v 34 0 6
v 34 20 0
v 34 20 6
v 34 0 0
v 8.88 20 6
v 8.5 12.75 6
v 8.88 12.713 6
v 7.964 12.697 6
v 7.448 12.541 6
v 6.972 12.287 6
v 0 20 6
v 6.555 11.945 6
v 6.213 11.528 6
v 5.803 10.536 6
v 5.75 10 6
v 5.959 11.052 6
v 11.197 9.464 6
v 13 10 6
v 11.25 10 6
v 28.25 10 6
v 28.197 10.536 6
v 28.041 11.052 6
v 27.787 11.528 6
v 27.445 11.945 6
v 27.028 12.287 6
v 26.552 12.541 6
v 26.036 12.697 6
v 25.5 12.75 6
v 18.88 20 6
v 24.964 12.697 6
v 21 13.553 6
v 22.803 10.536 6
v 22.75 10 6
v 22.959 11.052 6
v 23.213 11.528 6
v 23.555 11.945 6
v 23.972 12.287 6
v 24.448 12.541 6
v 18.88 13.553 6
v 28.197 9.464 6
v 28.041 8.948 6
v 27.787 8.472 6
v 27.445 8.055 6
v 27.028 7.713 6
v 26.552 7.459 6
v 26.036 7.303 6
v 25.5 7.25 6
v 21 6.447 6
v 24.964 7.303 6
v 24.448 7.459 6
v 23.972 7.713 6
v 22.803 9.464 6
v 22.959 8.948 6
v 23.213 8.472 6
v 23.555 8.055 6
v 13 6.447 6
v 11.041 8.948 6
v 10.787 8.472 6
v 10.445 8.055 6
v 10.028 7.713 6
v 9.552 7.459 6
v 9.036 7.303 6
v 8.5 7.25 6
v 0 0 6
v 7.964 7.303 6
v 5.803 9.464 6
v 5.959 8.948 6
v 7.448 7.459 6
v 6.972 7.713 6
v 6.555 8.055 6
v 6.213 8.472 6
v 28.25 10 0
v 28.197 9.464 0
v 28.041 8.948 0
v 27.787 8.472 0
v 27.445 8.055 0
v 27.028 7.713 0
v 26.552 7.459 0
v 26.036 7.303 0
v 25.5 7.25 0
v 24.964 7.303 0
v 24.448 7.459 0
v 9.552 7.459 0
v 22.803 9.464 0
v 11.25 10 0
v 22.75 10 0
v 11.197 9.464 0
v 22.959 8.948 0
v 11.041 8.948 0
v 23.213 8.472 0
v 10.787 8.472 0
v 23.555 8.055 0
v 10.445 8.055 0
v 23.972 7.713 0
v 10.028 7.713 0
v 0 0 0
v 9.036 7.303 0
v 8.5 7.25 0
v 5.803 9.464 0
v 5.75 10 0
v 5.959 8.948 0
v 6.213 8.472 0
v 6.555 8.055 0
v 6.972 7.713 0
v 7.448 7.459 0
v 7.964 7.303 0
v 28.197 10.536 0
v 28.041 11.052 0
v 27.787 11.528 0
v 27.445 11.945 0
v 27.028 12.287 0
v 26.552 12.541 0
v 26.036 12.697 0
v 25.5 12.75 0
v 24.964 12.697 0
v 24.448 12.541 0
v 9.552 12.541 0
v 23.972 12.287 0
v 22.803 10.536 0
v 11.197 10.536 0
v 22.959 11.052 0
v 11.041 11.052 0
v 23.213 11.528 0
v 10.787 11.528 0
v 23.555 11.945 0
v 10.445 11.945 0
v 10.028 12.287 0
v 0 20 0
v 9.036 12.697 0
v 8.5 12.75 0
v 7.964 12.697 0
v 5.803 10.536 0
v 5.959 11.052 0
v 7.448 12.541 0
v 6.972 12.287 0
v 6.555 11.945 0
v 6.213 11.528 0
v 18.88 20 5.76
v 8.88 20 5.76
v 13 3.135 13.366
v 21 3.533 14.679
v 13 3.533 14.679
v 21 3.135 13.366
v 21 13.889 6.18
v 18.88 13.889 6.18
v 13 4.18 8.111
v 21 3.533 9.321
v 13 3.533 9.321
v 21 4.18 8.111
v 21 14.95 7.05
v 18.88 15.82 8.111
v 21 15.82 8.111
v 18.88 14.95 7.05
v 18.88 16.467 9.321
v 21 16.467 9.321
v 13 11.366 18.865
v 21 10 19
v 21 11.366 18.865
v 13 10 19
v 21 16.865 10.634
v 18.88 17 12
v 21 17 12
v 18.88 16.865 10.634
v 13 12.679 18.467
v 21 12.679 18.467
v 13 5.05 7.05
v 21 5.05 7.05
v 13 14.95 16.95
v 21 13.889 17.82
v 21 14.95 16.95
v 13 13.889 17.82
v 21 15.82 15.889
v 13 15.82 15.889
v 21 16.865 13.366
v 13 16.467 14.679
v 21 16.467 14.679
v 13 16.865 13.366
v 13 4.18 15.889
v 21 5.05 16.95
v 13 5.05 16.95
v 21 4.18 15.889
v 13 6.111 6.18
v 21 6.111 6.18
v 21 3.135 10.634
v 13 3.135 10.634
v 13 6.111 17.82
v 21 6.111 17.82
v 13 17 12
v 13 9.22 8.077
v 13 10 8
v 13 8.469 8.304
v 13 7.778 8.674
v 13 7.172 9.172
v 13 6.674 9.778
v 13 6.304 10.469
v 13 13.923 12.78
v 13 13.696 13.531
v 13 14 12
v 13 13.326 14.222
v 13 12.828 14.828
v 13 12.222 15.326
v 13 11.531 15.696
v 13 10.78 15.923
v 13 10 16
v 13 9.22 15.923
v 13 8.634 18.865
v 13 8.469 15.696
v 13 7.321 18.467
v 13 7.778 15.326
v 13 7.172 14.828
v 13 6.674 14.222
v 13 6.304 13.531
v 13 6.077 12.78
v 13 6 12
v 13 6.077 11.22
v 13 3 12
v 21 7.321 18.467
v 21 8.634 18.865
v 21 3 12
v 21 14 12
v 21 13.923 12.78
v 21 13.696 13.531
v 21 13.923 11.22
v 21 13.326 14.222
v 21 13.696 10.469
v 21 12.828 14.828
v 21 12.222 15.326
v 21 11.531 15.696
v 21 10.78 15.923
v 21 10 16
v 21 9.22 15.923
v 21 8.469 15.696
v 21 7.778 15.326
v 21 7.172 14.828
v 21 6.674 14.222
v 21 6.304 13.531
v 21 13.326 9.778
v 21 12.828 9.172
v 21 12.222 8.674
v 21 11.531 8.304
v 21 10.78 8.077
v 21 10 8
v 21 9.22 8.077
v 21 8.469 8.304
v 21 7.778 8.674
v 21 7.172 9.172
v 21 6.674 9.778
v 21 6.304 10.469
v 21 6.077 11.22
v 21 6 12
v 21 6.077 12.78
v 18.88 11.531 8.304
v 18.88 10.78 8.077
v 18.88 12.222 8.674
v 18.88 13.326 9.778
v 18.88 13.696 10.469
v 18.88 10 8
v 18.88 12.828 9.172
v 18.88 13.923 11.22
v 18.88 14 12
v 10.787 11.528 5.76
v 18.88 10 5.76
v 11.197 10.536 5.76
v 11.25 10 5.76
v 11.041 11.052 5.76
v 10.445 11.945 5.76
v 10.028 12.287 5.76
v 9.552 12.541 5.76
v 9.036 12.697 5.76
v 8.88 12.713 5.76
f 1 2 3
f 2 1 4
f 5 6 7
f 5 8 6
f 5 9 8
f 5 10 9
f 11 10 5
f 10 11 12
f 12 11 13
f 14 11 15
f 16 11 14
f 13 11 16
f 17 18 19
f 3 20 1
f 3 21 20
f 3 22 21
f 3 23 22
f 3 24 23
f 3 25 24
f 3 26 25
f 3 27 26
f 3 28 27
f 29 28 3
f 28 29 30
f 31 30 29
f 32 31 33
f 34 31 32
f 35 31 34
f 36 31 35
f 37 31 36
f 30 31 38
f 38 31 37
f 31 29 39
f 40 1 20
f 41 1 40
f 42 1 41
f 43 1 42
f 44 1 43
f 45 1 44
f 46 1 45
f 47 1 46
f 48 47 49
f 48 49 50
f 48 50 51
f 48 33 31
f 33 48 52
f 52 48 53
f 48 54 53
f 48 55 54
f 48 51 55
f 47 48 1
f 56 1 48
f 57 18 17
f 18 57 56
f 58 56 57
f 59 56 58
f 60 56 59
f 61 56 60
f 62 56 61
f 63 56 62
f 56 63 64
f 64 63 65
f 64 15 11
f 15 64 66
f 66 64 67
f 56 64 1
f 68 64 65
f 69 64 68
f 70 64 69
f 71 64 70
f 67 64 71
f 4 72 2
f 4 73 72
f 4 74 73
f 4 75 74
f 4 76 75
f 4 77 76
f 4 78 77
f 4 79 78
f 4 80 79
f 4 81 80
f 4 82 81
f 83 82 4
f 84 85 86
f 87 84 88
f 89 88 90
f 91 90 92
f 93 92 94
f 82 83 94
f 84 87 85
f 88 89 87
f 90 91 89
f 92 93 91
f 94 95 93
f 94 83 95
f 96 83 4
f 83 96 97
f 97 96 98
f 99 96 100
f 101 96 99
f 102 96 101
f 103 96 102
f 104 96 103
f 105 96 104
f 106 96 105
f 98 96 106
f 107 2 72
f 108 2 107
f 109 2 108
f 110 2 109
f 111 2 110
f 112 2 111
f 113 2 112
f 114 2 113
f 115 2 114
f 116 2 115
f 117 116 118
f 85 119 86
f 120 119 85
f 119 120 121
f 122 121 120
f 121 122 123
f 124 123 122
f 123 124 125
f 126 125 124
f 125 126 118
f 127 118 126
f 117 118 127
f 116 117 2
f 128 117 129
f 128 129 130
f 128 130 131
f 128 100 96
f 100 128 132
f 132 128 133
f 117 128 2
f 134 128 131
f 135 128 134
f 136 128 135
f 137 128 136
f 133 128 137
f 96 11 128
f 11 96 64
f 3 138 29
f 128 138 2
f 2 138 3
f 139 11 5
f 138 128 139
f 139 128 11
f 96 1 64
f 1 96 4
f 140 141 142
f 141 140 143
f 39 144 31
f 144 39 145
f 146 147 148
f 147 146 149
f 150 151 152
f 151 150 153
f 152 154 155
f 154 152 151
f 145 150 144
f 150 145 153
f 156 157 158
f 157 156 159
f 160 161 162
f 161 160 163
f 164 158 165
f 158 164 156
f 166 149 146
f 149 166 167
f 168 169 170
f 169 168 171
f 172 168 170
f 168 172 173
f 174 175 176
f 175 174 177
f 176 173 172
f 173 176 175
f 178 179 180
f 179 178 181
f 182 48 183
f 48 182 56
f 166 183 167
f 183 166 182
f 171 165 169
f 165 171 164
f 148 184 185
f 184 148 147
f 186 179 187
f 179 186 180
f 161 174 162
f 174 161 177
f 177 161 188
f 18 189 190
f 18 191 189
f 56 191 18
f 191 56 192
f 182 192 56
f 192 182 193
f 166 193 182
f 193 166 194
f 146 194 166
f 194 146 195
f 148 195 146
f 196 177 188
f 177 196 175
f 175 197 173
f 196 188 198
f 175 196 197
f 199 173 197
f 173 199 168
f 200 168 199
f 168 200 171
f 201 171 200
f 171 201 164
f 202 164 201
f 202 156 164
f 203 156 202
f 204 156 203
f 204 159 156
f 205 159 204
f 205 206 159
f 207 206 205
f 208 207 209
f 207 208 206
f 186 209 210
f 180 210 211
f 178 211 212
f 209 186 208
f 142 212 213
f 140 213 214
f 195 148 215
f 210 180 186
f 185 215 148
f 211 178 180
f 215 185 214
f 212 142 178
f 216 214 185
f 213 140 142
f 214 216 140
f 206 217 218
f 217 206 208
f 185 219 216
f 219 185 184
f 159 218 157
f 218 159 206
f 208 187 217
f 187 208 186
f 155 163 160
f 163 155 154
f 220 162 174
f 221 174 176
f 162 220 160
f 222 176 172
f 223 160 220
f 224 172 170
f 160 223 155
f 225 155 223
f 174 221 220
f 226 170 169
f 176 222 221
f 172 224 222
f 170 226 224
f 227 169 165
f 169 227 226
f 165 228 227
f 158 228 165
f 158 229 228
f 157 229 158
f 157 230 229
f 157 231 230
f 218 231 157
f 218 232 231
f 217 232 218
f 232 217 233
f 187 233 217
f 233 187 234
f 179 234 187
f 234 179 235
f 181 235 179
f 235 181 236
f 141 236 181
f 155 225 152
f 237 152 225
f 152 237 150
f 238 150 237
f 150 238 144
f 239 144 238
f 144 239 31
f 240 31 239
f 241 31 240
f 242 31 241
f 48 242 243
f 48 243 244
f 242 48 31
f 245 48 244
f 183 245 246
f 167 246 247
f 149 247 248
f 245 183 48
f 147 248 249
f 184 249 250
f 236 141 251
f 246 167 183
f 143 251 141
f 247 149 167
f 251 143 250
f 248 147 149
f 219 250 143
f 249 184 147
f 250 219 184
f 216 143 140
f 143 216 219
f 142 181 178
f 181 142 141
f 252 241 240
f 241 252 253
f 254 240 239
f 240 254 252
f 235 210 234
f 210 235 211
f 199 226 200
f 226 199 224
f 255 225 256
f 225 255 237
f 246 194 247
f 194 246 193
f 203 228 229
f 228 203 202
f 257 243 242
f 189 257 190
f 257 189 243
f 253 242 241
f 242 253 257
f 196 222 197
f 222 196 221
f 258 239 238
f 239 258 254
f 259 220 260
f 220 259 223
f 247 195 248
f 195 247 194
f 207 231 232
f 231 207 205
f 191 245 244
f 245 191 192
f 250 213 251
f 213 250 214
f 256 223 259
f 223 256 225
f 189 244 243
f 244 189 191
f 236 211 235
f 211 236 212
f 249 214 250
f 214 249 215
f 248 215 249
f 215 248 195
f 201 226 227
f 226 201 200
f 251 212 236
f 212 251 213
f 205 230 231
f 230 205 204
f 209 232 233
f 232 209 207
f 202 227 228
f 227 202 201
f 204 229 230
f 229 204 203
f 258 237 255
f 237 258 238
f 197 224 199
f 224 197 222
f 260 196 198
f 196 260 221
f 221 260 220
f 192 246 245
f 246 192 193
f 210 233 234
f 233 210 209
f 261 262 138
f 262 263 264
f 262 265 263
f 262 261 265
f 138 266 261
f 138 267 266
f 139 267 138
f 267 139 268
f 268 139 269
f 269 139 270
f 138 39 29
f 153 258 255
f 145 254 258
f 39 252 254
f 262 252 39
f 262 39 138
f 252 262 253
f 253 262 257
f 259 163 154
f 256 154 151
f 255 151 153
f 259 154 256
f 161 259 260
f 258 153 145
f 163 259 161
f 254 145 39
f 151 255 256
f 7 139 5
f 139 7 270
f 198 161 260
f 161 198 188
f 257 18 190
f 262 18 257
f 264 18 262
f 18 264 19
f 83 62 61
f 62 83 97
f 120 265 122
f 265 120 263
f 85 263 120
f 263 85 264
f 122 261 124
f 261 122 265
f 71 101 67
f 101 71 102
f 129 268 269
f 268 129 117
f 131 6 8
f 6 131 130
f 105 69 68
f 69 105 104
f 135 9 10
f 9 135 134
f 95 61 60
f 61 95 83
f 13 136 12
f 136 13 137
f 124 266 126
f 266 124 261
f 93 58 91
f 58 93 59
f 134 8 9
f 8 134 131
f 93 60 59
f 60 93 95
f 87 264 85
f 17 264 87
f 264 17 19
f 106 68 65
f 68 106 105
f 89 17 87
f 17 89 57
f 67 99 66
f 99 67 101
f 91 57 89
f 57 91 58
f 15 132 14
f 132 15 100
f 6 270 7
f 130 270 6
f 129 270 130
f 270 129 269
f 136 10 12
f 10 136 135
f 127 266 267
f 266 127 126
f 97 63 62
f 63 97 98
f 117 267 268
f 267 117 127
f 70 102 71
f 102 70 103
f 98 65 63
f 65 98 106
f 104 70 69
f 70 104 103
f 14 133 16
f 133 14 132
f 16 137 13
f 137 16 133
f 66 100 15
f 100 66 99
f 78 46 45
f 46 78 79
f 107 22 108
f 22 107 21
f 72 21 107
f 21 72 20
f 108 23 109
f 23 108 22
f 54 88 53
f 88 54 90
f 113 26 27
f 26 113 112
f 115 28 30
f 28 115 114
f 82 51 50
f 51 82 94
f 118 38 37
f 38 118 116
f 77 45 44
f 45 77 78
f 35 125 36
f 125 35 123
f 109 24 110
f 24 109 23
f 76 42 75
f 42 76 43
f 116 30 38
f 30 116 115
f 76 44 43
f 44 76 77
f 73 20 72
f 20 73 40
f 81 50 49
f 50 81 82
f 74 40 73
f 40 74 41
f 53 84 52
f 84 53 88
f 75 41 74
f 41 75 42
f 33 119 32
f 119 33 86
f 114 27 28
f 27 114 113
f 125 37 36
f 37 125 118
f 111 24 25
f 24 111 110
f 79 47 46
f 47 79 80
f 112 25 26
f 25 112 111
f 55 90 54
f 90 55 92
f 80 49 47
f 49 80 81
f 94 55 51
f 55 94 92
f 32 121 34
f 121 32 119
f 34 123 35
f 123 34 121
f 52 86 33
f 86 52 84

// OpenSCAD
$fn = 32;

// ----------------------------------------------------------------------
// Cable clip: cable 8 mm, clamp 14 mm, base 34 mm
// ----------------------------------------------------------------------

// --- parameters (mm) ---
foot_w = 34;              // base length, X
foot_d = 20;              // base width, Y
foot_t = 6;               // base thickness
hose_seat_d = 14;         // clamp outside diameter
ring_t = 3;               // clamp wall
cable_d = 8;              // cable opening
ring_w = 8;               // clamp width along the cable
screw_d = 5.5;            // screw clearance
throat = 6.24;            // snap throat width
sink = 1;                 // overlap of the clamp into the base

module base() {
  cube([foot_w, foot_d, foot_t]);
}

module clamp() {
  translate([foot_w / 2, foot_d / 2, foot_t + hose_seat_d / 2 - sink]) rotate([0, 90, 0])
    cylinder(h = ring_w, d = hose_seat_d, center = true);
}

difference() {
  union() {
    base();
    clamp();
  }
  translate([foot_w / 2, foot_d / 2, foot_t + hose_seat_d / 2 - sink]) rotate([0, 90, 0]) translate([0, 0, -ring_w / 2 - 1]) cylinder(h = ring_w + 2, d = cable_d);
  /* snap throat: the opening is narrower than the cable */
  translate([foot_w / 2 - throat / 2, foot_d / 2, foot_t + hose_seat_d / 2 - sink]) rotate([0, 90, 0]) translate([0, 0, -ring_w / 2 - 1]) cube([throat, hose_seat_d + 2, ring_w + 2]);
  translate([8.5, foot_d / 2, -1]) cylinder(h = foot_t + 2, d = screw_d);
  translate([25.5, foot_d / 2, -1]) cylinder(h = foot_t + 2, d = screw_d);
}
